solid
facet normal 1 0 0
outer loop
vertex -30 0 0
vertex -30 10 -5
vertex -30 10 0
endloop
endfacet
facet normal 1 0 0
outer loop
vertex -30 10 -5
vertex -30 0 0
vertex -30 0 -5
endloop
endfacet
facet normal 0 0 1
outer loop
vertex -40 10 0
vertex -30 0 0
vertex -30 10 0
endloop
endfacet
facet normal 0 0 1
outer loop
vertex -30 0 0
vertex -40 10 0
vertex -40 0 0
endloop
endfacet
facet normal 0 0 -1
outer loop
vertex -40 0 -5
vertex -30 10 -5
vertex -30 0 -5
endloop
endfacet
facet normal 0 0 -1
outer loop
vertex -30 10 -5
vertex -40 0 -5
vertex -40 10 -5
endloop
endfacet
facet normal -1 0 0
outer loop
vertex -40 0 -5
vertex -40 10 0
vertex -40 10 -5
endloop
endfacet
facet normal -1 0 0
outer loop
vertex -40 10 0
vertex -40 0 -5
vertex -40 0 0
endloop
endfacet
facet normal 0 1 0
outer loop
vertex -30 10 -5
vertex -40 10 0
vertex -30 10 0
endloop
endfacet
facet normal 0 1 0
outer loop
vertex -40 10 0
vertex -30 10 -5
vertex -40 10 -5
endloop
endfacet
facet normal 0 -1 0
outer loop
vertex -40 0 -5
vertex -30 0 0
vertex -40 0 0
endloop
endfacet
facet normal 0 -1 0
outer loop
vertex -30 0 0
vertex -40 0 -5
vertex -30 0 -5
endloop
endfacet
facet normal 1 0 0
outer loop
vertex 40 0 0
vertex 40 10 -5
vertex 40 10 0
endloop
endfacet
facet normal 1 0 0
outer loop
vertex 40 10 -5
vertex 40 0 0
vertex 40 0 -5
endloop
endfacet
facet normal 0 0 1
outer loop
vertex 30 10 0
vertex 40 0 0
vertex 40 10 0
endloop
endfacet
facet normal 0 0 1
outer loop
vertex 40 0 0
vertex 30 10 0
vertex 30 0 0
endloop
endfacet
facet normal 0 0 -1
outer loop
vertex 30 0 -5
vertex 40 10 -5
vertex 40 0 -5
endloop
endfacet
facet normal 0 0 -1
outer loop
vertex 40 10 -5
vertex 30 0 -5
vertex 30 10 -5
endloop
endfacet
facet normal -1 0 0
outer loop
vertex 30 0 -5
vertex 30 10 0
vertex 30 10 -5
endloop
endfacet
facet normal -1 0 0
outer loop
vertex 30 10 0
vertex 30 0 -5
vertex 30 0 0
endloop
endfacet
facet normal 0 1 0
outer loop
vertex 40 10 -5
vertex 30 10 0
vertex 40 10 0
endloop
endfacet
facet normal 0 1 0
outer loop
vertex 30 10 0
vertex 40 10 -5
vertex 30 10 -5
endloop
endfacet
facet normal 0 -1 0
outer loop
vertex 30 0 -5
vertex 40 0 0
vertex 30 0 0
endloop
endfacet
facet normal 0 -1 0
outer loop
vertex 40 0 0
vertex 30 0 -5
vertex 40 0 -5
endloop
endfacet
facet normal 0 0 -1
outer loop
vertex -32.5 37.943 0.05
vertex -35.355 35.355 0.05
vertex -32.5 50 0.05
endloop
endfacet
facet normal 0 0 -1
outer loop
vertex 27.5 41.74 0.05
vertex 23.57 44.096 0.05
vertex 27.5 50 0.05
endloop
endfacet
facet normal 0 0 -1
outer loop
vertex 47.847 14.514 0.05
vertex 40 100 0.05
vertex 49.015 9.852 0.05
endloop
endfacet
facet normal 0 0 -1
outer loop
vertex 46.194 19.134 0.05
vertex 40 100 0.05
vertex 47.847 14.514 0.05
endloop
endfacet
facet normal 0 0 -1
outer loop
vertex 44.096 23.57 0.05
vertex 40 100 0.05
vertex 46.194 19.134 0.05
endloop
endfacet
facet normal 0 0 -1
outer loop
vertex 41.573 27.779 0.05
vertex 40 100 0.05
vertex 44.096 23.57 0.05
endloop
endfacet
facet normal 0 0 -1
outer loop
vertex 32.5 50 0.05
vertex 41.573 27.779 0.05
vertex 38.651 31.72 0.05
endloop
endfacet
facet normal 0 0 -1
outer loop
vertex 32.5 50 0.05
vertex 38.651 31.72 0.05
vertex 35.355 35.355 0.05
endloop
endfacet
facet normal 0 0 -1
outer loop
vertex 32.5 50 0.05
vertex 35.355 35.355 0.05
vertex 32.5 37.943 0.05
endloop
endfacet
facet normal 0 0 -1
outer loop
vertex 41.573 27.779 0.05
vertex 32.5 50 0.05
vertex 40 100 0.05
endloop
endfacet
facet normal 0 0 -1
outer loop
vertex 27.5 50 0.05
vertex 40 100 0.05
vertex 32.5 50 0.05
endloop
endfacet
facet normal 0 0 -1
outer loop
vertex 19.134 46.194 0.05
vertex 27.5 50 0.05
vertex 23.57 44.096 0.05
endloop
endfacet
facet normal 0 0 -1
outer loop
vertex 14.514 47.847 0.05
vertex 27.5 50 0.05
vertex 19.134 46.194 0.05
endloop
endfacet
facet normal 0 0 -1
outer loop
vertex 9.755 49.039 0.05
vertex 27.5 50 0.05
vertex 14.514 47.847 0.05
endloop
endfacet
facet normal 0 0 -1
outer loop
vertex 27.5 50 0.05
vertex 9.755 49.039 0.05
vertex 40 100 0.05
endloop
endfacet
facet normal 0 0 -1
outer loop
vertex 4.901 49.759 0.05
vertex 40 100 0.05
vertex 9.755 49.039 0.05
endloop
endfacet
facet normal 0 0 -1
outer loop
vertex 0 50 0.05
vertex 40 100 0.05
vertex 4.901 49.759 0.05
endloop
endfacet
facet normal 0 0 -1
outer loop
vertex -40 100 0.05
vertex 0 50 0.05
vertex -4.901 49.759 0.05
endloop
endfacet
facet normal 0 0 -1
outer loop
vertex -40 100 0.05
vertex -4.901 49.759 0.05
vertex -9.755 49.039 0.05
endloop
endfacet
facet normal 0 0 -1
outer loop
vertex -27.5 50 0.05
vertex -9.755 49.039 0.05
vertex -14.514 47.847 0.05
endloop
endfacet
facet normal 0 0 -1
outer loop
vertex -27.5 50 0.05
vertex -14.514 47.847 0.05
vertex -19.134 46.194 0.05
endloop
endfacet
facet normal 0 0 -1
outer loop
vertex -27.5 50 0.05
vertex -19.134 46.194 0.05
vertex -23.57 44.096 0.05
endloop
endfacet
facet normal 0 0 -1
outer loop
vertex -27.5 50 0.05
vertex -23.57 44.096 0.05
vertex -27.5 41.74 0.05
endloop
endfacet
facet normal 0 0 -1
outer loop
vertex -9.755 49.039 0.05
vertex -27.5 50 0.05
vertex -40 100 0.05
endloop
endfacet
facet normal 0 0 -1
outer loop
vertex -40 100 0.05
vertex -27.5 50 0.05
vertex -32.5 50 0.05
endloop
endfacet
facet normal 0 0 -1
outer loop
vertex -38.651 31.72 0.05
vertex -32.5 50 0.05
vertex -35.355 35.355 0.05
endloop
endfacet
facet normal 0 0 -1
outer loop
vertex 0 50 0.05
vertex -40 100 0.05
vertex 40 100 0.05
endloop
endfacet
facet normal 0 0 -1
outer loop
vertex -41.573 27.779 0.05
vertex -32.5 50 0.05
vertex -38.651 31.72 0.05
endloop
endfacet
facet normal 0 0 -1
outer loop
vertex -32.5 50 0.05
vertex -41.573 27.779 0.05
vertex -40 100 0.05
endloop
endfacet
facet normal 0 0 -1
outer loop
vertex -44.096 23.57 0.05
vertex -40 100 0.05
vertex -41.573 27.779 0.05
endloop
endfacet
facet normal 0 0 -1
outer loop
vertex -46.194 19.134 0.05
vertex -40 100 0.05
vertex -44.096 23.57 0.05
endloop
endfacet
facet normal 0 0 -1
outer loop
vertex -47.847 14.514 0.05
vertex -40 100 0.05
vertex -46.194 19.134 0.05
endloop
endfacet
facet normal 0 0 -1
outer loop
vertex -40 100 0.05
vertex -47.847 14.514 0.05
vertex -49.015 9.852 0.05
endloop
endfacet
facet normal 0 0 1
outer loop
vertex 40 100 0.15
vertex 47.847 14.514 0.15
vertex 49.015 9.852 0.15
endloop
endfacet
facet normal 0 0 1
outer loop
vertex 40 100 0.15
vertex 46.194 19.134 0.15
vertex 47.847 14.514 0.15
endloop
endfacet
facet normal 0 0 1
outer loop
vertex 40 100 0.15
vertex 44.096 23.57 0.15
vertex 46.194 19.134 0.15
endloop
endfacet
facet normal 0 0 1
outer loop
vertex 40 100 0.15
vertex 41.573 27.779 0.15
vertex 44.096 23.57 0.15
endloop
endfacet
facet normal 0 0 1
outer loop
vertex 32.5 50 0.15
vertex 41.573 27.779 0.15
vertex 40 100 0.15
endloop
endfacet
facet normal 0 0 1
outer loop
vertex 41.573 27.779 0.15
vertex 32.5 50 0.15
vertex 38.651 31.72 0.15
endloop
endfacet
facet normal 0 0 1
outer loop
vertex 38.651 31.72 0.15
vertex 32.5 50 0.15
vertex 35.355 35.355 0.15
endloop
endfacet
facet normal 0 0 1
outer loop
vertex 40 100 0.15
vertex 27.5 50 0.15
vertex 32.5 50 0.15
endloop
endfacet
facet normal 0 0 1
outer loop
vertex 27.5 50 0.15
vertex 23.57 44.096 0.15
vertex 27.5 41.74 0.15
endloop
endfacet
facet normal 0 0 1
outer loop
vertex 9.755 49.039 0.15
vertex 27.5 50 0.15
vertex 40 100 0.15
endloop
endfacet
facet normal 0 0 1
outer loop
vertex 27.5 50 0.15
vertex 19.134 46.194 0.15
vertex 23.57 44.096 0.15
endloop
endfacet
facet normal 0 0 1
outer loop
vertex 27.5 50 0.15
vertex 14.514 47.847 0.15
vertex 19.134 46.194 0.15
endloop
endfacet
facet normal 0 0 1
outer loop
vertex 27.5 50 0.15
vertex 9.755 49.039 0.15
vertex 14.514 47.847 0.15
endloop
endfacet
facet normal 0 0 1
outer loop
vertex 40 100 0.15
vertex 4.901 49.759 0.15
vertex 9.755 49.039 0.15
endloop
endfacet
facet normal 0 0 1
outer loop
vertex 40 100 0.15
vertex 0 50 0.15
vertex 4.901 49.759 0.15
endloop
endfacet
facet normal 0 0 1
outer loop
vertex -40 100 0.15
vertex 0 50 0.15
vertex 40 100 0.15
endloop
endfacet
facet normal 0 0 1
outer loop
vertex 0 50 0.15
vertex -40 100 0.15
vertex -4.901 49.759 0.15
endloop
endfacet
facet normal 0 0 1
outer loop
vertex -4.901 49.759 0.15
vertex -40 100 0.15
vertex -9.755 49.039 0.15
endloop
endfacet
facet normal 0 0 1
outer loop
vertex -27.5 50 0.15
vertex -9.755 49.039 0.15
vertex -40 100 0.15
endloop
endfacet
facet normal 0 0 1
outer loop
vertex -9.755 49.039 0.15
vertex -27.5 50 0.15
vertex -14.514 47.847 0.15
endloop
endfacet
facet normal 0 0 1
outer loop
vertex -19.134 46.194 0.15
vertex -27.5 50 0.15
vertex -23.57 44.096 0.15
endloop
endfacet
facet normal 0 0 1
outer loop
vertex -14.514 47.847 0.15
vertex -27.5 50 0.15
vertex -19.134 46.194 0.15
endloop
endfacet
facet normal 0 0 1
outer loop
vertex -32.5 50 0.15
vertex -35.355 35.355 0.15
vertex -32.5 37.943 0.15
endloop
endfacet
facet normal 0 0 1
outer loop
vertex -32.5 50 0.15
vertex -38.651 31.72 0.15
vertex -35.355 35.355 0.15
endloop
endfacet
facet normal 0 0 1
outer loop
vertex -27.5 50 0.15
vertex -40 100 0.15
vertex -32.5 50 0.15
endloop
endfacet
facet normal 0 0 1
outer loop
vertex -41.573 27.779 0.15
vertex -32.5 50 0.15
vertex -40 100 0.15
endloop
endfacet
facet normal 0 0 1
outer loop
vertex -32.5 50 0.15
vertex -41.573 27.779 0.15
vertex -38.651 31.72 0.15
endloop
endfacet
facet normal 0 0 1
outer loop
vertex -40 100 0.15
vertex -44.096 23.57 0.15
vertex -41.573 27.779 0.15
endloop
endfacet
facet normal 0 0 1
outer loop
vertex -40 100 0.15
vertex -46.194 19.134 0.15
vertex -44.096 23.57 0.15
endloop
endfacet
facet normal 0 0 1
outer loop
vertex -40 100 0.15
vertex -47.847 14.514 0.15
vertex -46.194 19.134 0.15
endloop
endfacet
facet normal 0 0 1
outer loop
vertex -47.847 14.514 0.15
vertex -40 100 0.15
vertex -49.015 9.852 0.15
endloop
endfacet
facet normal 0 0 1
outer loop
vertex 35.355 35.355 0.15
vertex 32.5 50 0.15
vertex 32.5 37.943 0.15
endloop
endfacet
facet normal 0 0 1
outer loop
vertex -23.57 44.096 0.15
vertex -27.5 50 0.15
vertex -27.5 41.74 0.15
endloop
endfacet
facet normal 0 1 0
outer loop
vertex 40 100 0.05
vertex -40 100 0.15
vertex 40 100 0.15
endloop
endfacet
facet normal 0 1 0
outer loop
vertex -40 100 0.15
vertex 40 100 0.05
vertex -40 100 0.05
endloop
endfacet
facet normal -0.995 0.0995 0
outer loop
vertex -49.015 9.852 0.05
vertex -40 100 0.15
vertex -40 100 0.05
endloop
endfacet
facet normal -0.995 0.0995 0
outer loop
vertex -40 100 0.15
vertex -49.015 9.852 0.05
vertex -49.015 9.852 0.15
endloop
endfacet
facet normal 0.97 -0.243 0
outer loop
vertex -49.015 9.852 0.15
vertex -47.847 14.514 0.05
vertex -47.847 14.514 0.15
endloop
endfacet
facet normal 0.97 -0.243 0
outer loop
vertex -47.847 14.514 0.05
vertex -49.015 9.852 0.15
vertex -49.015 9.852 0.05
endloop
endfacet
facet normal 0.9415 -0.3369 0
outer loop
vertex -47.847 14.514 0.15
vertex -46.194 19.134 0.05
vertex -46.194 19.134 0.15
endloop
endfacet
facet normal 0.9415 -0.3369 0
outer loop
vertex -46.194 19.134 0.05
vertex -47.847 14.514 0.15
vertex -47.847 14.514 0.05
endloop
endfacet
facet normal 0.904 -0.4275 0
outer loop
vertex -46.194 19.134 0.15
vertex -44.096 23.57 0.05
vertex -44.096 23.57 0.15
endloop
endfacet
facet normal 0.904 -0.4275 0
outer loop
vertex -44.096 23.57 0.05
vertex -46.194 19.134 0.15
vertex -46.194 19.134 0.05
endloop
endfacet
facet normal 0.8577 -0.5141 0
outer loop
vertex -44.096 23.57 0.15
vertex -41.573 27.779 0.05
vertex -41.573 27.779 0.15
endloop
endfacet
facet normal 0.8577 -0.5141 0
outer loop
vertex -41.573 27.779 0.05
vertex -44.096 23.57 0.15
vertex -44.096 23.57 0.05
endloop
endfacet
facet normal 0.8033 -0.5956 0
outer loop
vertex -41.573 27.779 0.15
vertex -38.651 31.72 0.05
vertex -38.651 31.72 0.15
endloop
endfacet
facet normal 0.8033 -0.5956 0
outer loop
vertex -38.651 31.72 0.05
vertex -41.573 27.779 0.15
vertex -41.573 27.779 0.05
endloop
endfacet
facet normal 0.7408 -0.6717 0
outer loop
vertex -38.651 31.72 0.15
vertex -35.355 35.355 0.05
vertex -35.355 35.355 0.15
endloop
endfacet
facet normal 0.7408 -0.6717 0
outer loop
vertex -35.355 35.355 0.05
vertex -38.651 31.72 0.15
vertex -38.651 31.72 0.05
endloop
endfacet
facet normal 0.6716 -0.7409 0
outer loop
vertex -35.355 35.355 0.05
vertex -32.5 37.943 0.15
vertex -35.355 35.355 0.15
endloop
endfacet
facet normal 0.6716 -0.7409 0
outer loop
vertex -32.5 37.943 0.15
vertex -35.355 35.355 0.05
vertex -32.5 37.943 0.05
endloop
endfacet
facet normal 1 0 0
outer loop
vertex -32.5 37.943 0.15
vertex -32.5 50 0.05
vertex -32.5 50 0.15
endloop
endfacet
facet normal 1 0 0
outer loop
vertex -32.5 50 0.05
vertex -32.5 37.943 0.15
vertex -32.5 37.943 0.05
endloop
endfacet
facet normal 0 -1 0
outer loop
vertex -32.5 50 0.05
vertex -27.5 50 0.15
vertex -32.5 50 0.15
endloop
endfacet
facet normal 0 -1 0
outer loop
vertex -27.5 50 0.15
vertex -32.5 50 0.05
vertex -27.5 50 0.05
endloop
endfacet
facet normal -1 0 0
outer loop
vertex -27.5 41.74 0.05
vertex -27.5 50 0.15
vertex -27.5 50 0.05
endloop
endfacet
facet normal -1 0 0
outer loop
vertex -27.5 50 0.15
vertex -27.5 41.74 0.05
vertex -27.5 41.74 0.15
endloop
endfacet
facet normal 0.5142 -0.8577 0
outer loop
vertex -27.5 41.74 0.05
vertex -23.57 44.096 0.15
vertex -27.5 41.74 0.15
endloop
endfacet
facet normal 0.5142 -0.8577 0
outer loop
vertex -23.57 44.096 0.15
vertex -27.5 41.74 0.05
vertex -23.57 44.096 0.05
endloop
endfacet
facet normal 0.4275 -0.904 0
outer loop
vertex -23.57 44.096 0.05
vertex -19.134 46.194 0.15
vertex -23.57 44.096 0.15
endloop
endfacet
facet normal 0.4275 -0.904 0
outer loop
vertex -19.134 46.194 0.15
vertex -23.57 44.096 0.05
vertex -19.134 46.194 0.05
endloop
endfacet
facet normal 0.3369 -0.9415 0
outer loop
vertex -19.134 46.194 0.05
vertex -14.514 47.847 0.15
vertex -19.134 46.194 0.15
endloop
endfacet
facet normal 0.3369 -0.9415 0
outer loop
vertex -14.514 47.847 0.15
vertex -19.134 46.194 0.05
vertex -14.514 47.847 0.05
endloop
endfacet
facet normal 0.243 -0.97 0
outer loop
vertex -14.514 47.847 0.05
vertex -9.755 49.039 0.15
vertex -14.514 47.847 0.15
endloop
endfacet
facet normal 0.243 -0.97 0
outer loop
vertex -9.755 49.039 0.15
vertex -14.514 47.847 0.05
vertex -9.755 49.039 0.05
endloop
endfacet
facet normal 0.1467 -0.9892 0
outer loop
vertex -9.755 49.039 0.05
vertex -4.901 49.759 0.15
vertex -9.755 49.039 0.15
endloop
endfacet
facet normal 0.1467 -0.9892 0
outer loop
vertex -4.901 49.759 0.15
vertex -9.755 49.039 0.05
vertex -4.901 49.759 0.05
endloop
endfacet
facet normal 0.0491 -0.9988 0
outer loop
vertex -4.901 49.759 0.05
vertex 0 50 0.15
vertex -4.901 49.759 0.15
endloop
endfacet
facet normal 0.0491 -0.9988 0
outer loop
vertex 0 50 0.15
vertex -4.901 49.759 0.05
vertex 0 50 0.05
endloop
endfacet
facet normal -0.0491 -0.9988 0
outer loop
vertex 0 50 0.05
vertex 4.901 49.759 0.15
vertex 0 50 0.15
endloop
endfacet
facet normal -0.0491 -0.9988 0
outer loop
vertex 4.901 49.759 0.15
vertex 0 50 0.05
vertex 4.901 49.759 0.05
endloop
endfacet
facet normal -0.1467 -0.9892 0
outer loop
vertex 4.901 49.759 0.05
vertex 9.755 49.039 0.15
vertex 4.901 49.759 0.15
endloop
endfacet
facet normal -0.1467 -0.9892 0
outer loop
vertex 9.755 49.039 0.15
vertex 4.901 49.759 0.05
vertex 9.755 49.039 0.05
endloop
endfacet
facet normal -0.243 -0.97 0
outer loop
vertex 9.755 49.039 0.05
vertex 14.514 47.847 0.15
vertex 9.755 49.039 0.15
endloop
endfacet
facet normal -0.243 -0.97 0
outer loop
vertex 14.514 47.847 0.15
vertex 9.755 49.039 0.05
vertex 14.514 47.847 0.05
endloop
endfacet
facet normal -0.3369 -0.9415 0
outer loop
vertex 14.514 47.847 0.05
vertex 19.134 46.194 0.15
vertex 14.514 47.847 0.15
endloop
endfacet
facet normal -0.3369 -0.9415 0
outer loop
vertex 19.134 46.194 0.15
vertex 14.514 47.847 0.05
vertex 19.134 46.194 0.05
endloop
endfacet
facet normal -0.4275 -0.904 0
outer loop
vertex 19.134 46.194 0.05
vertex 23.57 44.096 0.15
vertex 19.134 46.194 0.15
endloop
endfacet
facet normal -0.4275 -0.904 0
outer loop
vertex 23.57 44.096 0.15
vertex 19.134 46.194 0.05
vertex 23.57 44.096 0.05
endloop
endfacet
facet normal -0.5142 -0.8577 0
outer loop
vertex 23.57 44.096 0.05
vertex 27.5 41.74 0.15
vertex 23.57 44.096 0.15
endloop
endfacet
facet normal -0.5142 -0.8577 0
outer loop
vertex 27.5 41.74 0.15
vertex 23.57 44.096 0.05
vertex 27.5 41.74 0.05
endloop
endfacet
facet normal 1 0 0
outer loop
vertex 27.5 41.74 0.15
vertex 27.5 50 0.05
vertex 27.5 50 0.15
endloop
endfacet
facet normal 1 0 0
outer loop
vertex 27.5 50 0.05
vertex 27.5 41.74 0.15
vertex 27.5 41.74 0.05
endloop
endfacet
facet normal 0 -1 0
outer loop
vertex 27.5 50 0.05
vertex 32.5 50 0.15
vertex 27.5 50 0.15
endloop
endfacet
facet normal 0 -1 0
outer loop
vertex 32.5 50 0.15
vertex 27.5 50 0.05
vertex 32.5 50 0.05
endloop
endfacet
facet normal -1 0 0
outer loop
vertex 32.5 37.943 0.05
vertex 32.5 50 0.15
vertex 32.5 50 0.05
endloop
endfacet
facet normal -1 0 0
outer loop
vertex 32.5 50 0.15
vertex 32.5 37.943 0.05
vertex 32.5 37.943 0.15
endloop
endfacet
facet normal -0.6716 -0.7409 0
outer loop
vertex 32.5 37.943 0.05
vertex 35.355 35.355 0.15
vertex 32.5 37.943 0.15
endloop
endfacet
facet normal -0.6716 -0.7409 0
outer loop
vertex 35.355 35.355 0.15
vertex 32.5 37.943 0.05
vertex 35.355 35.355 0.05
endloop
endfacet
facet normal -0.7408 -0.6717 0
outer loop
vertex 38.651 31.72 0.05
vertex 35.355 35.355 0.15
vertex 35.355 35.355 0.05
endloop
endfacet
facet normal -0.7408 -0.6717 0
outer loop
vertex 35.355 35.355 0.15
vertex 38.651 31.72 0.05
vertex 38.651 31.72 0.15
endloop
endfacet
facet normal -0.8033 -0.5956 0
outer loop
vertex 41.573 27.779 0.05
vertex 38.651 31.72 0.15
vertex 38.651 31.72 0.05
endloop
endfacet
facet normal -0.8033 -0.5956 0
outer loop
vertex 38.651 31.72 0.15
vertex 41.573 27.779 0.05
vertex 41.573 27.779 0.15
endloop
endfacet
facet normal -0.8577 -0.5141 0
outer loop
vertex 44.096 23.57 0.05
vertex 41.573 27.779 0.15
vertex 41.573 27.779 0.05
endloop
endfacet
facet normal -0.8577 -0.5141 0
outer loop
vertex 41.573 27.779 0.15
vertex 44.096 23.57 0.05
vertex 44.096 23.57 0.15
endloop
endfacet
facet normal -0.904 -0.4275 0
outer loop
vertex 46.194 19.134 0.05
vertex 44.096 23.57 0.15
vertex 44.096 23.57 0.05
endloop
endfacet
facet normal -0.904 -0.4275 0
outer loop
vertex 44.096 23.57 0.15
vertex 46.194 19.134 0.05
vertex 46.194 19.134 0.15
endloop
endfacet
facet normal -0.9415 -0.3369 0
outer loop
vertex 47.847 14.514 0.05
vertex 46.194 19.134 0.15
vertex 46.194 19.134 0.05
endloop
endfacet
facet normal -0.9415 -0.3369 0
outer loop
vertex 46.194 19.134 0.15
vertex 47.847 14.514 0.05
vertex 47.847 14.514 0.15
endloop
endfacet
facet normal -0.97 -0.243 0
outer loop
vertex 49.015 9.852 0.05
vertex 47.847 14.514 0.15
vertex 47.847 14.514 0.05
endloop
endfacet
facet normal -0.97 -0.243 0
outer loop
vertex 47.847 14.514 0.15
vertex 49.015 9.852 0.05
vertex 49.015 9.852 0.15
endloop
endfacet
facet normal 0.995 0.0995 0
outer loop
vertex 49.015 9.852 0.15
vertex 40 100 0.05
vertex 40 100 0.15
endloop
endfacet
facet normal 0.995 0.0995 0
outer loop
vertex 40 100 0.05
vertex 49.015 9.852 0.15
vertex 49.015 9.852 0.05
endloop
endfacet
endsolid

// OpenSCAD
module tapered_plate() {
    difference() {
        // Main trapezoidal plate
        polygon(points=[[50, 0], [-50, 0], [-40, 100], [40, 100]]);
        
        // Semicircular cutout
        translate([0, 0])
            circle(r=50, $fn=64);
        
        // Rectangular slots
        translate([-30, 10])
            square([5, 20], center=true);
        translate([30, 10])
            square([5, 20], center=true);
        translate([-30, 40])
            square([5, 20], center=true);
        translate([30, 40])
            square([5, 20], center=true);
        
        // Stencil-style text
        translate([-20, 70])
            linear_extrude(height=0.1)
                text("EEZYbot ARM MK2", size=10, halign="center", valign="center");
    }
}

module mounting_feet() {
    translate([-40, 0, -5])
        cube([10, 10, 5], center=false);
    translate([30, 0, -5])
        cube([10, 10, 5], center=false);
}

translate([0, 0, 0.05])
    linear_extrude(height=0.1)
        tapered_plate();

mounting_feet();
